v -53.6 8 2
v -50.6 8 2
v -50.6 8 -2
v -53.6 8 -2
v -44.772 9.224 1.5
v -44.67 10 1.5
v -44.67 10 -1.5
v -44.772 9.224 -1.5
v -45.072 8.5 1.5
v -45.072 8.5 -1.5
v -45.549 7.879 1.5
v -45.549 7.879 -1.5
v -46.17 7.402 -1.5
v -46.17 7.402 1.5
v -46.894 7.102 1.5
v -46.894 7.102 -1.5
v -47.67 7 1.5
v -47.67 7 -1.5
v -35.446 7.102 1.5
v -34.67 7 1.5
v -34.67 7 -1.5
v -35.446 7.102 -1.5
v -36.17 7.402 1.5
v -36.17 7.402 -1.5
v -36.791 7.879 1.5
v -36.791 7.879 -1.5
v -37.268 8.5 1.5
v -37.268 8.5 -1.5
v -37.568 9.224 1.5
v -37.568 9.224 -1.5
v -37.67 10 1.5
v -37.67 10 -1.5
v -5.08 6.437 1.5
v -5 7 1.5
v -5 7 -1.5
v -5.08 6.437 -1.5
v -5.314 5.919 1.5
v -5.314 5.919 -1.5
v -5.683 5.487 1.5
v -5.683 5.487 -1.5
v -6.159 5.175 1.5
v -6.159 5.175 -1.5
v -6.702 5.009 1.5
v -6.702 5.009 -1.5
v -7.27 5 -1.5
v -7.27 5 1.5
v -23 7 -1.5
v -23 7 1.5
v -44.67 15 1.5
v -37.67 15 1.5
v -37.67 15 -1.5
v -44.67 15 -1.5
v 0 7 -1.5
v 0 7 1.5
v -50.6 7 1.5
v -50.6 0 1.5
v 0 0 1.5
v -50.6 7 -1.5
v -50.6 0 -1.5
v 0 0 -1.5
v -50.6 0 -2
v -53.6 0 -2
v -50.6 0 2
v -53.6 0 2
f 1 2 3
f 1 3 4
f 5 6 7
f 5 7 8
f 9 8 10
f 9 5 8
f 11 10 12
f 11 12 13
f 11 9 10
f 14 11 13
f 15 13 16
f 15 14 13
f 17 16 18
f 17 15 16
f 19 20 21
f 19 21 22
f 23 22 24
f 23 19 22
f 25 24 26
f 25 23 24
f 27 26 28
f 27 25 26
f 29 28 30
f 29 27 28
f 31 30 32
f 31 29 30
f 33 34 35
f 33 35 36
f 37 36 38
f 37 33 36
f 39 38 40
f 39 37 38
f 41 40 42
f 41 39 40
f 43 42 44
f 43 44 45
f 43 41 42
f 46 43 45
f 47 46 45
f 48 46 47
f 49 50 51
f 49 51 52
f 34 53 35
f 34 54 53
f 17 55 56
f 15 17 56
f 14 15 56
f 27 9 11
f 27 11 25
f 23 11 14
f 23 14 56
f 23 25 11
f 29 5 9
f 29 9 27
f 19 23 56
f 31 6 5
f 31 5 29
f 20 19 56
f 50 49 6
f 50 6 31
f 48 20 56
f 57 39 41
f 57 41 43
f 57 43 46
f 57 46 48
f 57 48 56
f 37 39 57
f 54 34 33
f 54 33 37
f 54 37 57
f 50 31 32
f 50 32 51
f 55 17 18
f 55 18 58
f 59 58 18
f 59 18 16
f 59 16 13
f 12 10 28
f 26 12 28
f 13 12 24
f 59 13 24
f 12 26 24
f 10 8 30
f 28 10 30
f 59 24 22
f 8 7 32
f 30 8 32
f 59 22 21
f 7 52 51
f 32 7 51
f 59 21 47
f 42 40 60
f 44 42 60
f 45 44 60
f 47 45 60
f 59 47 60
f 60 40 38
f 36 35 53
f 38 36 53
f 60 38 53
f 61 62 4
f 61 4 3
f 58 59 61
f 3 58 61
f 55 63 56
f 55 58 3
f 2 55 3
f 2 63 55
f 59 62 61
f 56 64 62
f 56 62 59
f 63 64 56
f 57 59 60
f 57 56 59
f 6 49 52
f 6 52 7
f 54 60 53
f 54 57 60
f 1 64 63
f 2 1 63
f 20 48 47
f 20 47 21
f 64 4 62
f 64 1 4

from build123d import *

# Parameters (mm, degrees)
BOSS_EXTRUDE1_DEPTH = 1.5
BOSS_EXTRUDE2_DEPTH = 2


with BuildPart() as part:
    # Sketch1 → Boss-Extrude1 (new, symmetric)
    with BuildSketch(Plane.XY):
        with BuildLine():
            Line((0, 7), (-5, 7))
            ThreePointArc((-5, 7), (-5.683439754, 5.487162066), (-7.270399626, 5))
            Line((-7.270399626, 5), (-23, 7))
            Line((-23, 7), (-34.67, 7))
            ThreePointArc((-34.67, 7), (-36.791320344, 7.878679656), (-37.67, 10))
            Line((-37.67, 10), (-37.67, 15))
            Line((-37.67, 15), (-44.67, 15))
            Line((-44.67, 15), (-44.67, 10))
            ThreePointArc((-44.67, 10), (-45.548679656, 7.878679656), (-47.67, 7))
            Line((-47.67, 7), (-50.6, 7))
            Line((-50.6, 7), (-50.6, 0))
            Line((-50.6, 0), (0, 0))
            Line((0, 0), (0, 7))
        make_face()
    extrude(amount=BOSS_EXTRUDE1_DEPTH, both=True)

    # Sketch1<6> → Boss-Extrude2 (add, symmetric)
    with BuildSketch(Plane.XY):
        Polygon((-53.6, 0), (-50.6, 0), (-50.6, 7), (-50.6, 8), (-53.6, 8), align=None)
    extrude(amount=BOSS_EXTRUDE2_DEPTH, both=True)


solid = part.part
